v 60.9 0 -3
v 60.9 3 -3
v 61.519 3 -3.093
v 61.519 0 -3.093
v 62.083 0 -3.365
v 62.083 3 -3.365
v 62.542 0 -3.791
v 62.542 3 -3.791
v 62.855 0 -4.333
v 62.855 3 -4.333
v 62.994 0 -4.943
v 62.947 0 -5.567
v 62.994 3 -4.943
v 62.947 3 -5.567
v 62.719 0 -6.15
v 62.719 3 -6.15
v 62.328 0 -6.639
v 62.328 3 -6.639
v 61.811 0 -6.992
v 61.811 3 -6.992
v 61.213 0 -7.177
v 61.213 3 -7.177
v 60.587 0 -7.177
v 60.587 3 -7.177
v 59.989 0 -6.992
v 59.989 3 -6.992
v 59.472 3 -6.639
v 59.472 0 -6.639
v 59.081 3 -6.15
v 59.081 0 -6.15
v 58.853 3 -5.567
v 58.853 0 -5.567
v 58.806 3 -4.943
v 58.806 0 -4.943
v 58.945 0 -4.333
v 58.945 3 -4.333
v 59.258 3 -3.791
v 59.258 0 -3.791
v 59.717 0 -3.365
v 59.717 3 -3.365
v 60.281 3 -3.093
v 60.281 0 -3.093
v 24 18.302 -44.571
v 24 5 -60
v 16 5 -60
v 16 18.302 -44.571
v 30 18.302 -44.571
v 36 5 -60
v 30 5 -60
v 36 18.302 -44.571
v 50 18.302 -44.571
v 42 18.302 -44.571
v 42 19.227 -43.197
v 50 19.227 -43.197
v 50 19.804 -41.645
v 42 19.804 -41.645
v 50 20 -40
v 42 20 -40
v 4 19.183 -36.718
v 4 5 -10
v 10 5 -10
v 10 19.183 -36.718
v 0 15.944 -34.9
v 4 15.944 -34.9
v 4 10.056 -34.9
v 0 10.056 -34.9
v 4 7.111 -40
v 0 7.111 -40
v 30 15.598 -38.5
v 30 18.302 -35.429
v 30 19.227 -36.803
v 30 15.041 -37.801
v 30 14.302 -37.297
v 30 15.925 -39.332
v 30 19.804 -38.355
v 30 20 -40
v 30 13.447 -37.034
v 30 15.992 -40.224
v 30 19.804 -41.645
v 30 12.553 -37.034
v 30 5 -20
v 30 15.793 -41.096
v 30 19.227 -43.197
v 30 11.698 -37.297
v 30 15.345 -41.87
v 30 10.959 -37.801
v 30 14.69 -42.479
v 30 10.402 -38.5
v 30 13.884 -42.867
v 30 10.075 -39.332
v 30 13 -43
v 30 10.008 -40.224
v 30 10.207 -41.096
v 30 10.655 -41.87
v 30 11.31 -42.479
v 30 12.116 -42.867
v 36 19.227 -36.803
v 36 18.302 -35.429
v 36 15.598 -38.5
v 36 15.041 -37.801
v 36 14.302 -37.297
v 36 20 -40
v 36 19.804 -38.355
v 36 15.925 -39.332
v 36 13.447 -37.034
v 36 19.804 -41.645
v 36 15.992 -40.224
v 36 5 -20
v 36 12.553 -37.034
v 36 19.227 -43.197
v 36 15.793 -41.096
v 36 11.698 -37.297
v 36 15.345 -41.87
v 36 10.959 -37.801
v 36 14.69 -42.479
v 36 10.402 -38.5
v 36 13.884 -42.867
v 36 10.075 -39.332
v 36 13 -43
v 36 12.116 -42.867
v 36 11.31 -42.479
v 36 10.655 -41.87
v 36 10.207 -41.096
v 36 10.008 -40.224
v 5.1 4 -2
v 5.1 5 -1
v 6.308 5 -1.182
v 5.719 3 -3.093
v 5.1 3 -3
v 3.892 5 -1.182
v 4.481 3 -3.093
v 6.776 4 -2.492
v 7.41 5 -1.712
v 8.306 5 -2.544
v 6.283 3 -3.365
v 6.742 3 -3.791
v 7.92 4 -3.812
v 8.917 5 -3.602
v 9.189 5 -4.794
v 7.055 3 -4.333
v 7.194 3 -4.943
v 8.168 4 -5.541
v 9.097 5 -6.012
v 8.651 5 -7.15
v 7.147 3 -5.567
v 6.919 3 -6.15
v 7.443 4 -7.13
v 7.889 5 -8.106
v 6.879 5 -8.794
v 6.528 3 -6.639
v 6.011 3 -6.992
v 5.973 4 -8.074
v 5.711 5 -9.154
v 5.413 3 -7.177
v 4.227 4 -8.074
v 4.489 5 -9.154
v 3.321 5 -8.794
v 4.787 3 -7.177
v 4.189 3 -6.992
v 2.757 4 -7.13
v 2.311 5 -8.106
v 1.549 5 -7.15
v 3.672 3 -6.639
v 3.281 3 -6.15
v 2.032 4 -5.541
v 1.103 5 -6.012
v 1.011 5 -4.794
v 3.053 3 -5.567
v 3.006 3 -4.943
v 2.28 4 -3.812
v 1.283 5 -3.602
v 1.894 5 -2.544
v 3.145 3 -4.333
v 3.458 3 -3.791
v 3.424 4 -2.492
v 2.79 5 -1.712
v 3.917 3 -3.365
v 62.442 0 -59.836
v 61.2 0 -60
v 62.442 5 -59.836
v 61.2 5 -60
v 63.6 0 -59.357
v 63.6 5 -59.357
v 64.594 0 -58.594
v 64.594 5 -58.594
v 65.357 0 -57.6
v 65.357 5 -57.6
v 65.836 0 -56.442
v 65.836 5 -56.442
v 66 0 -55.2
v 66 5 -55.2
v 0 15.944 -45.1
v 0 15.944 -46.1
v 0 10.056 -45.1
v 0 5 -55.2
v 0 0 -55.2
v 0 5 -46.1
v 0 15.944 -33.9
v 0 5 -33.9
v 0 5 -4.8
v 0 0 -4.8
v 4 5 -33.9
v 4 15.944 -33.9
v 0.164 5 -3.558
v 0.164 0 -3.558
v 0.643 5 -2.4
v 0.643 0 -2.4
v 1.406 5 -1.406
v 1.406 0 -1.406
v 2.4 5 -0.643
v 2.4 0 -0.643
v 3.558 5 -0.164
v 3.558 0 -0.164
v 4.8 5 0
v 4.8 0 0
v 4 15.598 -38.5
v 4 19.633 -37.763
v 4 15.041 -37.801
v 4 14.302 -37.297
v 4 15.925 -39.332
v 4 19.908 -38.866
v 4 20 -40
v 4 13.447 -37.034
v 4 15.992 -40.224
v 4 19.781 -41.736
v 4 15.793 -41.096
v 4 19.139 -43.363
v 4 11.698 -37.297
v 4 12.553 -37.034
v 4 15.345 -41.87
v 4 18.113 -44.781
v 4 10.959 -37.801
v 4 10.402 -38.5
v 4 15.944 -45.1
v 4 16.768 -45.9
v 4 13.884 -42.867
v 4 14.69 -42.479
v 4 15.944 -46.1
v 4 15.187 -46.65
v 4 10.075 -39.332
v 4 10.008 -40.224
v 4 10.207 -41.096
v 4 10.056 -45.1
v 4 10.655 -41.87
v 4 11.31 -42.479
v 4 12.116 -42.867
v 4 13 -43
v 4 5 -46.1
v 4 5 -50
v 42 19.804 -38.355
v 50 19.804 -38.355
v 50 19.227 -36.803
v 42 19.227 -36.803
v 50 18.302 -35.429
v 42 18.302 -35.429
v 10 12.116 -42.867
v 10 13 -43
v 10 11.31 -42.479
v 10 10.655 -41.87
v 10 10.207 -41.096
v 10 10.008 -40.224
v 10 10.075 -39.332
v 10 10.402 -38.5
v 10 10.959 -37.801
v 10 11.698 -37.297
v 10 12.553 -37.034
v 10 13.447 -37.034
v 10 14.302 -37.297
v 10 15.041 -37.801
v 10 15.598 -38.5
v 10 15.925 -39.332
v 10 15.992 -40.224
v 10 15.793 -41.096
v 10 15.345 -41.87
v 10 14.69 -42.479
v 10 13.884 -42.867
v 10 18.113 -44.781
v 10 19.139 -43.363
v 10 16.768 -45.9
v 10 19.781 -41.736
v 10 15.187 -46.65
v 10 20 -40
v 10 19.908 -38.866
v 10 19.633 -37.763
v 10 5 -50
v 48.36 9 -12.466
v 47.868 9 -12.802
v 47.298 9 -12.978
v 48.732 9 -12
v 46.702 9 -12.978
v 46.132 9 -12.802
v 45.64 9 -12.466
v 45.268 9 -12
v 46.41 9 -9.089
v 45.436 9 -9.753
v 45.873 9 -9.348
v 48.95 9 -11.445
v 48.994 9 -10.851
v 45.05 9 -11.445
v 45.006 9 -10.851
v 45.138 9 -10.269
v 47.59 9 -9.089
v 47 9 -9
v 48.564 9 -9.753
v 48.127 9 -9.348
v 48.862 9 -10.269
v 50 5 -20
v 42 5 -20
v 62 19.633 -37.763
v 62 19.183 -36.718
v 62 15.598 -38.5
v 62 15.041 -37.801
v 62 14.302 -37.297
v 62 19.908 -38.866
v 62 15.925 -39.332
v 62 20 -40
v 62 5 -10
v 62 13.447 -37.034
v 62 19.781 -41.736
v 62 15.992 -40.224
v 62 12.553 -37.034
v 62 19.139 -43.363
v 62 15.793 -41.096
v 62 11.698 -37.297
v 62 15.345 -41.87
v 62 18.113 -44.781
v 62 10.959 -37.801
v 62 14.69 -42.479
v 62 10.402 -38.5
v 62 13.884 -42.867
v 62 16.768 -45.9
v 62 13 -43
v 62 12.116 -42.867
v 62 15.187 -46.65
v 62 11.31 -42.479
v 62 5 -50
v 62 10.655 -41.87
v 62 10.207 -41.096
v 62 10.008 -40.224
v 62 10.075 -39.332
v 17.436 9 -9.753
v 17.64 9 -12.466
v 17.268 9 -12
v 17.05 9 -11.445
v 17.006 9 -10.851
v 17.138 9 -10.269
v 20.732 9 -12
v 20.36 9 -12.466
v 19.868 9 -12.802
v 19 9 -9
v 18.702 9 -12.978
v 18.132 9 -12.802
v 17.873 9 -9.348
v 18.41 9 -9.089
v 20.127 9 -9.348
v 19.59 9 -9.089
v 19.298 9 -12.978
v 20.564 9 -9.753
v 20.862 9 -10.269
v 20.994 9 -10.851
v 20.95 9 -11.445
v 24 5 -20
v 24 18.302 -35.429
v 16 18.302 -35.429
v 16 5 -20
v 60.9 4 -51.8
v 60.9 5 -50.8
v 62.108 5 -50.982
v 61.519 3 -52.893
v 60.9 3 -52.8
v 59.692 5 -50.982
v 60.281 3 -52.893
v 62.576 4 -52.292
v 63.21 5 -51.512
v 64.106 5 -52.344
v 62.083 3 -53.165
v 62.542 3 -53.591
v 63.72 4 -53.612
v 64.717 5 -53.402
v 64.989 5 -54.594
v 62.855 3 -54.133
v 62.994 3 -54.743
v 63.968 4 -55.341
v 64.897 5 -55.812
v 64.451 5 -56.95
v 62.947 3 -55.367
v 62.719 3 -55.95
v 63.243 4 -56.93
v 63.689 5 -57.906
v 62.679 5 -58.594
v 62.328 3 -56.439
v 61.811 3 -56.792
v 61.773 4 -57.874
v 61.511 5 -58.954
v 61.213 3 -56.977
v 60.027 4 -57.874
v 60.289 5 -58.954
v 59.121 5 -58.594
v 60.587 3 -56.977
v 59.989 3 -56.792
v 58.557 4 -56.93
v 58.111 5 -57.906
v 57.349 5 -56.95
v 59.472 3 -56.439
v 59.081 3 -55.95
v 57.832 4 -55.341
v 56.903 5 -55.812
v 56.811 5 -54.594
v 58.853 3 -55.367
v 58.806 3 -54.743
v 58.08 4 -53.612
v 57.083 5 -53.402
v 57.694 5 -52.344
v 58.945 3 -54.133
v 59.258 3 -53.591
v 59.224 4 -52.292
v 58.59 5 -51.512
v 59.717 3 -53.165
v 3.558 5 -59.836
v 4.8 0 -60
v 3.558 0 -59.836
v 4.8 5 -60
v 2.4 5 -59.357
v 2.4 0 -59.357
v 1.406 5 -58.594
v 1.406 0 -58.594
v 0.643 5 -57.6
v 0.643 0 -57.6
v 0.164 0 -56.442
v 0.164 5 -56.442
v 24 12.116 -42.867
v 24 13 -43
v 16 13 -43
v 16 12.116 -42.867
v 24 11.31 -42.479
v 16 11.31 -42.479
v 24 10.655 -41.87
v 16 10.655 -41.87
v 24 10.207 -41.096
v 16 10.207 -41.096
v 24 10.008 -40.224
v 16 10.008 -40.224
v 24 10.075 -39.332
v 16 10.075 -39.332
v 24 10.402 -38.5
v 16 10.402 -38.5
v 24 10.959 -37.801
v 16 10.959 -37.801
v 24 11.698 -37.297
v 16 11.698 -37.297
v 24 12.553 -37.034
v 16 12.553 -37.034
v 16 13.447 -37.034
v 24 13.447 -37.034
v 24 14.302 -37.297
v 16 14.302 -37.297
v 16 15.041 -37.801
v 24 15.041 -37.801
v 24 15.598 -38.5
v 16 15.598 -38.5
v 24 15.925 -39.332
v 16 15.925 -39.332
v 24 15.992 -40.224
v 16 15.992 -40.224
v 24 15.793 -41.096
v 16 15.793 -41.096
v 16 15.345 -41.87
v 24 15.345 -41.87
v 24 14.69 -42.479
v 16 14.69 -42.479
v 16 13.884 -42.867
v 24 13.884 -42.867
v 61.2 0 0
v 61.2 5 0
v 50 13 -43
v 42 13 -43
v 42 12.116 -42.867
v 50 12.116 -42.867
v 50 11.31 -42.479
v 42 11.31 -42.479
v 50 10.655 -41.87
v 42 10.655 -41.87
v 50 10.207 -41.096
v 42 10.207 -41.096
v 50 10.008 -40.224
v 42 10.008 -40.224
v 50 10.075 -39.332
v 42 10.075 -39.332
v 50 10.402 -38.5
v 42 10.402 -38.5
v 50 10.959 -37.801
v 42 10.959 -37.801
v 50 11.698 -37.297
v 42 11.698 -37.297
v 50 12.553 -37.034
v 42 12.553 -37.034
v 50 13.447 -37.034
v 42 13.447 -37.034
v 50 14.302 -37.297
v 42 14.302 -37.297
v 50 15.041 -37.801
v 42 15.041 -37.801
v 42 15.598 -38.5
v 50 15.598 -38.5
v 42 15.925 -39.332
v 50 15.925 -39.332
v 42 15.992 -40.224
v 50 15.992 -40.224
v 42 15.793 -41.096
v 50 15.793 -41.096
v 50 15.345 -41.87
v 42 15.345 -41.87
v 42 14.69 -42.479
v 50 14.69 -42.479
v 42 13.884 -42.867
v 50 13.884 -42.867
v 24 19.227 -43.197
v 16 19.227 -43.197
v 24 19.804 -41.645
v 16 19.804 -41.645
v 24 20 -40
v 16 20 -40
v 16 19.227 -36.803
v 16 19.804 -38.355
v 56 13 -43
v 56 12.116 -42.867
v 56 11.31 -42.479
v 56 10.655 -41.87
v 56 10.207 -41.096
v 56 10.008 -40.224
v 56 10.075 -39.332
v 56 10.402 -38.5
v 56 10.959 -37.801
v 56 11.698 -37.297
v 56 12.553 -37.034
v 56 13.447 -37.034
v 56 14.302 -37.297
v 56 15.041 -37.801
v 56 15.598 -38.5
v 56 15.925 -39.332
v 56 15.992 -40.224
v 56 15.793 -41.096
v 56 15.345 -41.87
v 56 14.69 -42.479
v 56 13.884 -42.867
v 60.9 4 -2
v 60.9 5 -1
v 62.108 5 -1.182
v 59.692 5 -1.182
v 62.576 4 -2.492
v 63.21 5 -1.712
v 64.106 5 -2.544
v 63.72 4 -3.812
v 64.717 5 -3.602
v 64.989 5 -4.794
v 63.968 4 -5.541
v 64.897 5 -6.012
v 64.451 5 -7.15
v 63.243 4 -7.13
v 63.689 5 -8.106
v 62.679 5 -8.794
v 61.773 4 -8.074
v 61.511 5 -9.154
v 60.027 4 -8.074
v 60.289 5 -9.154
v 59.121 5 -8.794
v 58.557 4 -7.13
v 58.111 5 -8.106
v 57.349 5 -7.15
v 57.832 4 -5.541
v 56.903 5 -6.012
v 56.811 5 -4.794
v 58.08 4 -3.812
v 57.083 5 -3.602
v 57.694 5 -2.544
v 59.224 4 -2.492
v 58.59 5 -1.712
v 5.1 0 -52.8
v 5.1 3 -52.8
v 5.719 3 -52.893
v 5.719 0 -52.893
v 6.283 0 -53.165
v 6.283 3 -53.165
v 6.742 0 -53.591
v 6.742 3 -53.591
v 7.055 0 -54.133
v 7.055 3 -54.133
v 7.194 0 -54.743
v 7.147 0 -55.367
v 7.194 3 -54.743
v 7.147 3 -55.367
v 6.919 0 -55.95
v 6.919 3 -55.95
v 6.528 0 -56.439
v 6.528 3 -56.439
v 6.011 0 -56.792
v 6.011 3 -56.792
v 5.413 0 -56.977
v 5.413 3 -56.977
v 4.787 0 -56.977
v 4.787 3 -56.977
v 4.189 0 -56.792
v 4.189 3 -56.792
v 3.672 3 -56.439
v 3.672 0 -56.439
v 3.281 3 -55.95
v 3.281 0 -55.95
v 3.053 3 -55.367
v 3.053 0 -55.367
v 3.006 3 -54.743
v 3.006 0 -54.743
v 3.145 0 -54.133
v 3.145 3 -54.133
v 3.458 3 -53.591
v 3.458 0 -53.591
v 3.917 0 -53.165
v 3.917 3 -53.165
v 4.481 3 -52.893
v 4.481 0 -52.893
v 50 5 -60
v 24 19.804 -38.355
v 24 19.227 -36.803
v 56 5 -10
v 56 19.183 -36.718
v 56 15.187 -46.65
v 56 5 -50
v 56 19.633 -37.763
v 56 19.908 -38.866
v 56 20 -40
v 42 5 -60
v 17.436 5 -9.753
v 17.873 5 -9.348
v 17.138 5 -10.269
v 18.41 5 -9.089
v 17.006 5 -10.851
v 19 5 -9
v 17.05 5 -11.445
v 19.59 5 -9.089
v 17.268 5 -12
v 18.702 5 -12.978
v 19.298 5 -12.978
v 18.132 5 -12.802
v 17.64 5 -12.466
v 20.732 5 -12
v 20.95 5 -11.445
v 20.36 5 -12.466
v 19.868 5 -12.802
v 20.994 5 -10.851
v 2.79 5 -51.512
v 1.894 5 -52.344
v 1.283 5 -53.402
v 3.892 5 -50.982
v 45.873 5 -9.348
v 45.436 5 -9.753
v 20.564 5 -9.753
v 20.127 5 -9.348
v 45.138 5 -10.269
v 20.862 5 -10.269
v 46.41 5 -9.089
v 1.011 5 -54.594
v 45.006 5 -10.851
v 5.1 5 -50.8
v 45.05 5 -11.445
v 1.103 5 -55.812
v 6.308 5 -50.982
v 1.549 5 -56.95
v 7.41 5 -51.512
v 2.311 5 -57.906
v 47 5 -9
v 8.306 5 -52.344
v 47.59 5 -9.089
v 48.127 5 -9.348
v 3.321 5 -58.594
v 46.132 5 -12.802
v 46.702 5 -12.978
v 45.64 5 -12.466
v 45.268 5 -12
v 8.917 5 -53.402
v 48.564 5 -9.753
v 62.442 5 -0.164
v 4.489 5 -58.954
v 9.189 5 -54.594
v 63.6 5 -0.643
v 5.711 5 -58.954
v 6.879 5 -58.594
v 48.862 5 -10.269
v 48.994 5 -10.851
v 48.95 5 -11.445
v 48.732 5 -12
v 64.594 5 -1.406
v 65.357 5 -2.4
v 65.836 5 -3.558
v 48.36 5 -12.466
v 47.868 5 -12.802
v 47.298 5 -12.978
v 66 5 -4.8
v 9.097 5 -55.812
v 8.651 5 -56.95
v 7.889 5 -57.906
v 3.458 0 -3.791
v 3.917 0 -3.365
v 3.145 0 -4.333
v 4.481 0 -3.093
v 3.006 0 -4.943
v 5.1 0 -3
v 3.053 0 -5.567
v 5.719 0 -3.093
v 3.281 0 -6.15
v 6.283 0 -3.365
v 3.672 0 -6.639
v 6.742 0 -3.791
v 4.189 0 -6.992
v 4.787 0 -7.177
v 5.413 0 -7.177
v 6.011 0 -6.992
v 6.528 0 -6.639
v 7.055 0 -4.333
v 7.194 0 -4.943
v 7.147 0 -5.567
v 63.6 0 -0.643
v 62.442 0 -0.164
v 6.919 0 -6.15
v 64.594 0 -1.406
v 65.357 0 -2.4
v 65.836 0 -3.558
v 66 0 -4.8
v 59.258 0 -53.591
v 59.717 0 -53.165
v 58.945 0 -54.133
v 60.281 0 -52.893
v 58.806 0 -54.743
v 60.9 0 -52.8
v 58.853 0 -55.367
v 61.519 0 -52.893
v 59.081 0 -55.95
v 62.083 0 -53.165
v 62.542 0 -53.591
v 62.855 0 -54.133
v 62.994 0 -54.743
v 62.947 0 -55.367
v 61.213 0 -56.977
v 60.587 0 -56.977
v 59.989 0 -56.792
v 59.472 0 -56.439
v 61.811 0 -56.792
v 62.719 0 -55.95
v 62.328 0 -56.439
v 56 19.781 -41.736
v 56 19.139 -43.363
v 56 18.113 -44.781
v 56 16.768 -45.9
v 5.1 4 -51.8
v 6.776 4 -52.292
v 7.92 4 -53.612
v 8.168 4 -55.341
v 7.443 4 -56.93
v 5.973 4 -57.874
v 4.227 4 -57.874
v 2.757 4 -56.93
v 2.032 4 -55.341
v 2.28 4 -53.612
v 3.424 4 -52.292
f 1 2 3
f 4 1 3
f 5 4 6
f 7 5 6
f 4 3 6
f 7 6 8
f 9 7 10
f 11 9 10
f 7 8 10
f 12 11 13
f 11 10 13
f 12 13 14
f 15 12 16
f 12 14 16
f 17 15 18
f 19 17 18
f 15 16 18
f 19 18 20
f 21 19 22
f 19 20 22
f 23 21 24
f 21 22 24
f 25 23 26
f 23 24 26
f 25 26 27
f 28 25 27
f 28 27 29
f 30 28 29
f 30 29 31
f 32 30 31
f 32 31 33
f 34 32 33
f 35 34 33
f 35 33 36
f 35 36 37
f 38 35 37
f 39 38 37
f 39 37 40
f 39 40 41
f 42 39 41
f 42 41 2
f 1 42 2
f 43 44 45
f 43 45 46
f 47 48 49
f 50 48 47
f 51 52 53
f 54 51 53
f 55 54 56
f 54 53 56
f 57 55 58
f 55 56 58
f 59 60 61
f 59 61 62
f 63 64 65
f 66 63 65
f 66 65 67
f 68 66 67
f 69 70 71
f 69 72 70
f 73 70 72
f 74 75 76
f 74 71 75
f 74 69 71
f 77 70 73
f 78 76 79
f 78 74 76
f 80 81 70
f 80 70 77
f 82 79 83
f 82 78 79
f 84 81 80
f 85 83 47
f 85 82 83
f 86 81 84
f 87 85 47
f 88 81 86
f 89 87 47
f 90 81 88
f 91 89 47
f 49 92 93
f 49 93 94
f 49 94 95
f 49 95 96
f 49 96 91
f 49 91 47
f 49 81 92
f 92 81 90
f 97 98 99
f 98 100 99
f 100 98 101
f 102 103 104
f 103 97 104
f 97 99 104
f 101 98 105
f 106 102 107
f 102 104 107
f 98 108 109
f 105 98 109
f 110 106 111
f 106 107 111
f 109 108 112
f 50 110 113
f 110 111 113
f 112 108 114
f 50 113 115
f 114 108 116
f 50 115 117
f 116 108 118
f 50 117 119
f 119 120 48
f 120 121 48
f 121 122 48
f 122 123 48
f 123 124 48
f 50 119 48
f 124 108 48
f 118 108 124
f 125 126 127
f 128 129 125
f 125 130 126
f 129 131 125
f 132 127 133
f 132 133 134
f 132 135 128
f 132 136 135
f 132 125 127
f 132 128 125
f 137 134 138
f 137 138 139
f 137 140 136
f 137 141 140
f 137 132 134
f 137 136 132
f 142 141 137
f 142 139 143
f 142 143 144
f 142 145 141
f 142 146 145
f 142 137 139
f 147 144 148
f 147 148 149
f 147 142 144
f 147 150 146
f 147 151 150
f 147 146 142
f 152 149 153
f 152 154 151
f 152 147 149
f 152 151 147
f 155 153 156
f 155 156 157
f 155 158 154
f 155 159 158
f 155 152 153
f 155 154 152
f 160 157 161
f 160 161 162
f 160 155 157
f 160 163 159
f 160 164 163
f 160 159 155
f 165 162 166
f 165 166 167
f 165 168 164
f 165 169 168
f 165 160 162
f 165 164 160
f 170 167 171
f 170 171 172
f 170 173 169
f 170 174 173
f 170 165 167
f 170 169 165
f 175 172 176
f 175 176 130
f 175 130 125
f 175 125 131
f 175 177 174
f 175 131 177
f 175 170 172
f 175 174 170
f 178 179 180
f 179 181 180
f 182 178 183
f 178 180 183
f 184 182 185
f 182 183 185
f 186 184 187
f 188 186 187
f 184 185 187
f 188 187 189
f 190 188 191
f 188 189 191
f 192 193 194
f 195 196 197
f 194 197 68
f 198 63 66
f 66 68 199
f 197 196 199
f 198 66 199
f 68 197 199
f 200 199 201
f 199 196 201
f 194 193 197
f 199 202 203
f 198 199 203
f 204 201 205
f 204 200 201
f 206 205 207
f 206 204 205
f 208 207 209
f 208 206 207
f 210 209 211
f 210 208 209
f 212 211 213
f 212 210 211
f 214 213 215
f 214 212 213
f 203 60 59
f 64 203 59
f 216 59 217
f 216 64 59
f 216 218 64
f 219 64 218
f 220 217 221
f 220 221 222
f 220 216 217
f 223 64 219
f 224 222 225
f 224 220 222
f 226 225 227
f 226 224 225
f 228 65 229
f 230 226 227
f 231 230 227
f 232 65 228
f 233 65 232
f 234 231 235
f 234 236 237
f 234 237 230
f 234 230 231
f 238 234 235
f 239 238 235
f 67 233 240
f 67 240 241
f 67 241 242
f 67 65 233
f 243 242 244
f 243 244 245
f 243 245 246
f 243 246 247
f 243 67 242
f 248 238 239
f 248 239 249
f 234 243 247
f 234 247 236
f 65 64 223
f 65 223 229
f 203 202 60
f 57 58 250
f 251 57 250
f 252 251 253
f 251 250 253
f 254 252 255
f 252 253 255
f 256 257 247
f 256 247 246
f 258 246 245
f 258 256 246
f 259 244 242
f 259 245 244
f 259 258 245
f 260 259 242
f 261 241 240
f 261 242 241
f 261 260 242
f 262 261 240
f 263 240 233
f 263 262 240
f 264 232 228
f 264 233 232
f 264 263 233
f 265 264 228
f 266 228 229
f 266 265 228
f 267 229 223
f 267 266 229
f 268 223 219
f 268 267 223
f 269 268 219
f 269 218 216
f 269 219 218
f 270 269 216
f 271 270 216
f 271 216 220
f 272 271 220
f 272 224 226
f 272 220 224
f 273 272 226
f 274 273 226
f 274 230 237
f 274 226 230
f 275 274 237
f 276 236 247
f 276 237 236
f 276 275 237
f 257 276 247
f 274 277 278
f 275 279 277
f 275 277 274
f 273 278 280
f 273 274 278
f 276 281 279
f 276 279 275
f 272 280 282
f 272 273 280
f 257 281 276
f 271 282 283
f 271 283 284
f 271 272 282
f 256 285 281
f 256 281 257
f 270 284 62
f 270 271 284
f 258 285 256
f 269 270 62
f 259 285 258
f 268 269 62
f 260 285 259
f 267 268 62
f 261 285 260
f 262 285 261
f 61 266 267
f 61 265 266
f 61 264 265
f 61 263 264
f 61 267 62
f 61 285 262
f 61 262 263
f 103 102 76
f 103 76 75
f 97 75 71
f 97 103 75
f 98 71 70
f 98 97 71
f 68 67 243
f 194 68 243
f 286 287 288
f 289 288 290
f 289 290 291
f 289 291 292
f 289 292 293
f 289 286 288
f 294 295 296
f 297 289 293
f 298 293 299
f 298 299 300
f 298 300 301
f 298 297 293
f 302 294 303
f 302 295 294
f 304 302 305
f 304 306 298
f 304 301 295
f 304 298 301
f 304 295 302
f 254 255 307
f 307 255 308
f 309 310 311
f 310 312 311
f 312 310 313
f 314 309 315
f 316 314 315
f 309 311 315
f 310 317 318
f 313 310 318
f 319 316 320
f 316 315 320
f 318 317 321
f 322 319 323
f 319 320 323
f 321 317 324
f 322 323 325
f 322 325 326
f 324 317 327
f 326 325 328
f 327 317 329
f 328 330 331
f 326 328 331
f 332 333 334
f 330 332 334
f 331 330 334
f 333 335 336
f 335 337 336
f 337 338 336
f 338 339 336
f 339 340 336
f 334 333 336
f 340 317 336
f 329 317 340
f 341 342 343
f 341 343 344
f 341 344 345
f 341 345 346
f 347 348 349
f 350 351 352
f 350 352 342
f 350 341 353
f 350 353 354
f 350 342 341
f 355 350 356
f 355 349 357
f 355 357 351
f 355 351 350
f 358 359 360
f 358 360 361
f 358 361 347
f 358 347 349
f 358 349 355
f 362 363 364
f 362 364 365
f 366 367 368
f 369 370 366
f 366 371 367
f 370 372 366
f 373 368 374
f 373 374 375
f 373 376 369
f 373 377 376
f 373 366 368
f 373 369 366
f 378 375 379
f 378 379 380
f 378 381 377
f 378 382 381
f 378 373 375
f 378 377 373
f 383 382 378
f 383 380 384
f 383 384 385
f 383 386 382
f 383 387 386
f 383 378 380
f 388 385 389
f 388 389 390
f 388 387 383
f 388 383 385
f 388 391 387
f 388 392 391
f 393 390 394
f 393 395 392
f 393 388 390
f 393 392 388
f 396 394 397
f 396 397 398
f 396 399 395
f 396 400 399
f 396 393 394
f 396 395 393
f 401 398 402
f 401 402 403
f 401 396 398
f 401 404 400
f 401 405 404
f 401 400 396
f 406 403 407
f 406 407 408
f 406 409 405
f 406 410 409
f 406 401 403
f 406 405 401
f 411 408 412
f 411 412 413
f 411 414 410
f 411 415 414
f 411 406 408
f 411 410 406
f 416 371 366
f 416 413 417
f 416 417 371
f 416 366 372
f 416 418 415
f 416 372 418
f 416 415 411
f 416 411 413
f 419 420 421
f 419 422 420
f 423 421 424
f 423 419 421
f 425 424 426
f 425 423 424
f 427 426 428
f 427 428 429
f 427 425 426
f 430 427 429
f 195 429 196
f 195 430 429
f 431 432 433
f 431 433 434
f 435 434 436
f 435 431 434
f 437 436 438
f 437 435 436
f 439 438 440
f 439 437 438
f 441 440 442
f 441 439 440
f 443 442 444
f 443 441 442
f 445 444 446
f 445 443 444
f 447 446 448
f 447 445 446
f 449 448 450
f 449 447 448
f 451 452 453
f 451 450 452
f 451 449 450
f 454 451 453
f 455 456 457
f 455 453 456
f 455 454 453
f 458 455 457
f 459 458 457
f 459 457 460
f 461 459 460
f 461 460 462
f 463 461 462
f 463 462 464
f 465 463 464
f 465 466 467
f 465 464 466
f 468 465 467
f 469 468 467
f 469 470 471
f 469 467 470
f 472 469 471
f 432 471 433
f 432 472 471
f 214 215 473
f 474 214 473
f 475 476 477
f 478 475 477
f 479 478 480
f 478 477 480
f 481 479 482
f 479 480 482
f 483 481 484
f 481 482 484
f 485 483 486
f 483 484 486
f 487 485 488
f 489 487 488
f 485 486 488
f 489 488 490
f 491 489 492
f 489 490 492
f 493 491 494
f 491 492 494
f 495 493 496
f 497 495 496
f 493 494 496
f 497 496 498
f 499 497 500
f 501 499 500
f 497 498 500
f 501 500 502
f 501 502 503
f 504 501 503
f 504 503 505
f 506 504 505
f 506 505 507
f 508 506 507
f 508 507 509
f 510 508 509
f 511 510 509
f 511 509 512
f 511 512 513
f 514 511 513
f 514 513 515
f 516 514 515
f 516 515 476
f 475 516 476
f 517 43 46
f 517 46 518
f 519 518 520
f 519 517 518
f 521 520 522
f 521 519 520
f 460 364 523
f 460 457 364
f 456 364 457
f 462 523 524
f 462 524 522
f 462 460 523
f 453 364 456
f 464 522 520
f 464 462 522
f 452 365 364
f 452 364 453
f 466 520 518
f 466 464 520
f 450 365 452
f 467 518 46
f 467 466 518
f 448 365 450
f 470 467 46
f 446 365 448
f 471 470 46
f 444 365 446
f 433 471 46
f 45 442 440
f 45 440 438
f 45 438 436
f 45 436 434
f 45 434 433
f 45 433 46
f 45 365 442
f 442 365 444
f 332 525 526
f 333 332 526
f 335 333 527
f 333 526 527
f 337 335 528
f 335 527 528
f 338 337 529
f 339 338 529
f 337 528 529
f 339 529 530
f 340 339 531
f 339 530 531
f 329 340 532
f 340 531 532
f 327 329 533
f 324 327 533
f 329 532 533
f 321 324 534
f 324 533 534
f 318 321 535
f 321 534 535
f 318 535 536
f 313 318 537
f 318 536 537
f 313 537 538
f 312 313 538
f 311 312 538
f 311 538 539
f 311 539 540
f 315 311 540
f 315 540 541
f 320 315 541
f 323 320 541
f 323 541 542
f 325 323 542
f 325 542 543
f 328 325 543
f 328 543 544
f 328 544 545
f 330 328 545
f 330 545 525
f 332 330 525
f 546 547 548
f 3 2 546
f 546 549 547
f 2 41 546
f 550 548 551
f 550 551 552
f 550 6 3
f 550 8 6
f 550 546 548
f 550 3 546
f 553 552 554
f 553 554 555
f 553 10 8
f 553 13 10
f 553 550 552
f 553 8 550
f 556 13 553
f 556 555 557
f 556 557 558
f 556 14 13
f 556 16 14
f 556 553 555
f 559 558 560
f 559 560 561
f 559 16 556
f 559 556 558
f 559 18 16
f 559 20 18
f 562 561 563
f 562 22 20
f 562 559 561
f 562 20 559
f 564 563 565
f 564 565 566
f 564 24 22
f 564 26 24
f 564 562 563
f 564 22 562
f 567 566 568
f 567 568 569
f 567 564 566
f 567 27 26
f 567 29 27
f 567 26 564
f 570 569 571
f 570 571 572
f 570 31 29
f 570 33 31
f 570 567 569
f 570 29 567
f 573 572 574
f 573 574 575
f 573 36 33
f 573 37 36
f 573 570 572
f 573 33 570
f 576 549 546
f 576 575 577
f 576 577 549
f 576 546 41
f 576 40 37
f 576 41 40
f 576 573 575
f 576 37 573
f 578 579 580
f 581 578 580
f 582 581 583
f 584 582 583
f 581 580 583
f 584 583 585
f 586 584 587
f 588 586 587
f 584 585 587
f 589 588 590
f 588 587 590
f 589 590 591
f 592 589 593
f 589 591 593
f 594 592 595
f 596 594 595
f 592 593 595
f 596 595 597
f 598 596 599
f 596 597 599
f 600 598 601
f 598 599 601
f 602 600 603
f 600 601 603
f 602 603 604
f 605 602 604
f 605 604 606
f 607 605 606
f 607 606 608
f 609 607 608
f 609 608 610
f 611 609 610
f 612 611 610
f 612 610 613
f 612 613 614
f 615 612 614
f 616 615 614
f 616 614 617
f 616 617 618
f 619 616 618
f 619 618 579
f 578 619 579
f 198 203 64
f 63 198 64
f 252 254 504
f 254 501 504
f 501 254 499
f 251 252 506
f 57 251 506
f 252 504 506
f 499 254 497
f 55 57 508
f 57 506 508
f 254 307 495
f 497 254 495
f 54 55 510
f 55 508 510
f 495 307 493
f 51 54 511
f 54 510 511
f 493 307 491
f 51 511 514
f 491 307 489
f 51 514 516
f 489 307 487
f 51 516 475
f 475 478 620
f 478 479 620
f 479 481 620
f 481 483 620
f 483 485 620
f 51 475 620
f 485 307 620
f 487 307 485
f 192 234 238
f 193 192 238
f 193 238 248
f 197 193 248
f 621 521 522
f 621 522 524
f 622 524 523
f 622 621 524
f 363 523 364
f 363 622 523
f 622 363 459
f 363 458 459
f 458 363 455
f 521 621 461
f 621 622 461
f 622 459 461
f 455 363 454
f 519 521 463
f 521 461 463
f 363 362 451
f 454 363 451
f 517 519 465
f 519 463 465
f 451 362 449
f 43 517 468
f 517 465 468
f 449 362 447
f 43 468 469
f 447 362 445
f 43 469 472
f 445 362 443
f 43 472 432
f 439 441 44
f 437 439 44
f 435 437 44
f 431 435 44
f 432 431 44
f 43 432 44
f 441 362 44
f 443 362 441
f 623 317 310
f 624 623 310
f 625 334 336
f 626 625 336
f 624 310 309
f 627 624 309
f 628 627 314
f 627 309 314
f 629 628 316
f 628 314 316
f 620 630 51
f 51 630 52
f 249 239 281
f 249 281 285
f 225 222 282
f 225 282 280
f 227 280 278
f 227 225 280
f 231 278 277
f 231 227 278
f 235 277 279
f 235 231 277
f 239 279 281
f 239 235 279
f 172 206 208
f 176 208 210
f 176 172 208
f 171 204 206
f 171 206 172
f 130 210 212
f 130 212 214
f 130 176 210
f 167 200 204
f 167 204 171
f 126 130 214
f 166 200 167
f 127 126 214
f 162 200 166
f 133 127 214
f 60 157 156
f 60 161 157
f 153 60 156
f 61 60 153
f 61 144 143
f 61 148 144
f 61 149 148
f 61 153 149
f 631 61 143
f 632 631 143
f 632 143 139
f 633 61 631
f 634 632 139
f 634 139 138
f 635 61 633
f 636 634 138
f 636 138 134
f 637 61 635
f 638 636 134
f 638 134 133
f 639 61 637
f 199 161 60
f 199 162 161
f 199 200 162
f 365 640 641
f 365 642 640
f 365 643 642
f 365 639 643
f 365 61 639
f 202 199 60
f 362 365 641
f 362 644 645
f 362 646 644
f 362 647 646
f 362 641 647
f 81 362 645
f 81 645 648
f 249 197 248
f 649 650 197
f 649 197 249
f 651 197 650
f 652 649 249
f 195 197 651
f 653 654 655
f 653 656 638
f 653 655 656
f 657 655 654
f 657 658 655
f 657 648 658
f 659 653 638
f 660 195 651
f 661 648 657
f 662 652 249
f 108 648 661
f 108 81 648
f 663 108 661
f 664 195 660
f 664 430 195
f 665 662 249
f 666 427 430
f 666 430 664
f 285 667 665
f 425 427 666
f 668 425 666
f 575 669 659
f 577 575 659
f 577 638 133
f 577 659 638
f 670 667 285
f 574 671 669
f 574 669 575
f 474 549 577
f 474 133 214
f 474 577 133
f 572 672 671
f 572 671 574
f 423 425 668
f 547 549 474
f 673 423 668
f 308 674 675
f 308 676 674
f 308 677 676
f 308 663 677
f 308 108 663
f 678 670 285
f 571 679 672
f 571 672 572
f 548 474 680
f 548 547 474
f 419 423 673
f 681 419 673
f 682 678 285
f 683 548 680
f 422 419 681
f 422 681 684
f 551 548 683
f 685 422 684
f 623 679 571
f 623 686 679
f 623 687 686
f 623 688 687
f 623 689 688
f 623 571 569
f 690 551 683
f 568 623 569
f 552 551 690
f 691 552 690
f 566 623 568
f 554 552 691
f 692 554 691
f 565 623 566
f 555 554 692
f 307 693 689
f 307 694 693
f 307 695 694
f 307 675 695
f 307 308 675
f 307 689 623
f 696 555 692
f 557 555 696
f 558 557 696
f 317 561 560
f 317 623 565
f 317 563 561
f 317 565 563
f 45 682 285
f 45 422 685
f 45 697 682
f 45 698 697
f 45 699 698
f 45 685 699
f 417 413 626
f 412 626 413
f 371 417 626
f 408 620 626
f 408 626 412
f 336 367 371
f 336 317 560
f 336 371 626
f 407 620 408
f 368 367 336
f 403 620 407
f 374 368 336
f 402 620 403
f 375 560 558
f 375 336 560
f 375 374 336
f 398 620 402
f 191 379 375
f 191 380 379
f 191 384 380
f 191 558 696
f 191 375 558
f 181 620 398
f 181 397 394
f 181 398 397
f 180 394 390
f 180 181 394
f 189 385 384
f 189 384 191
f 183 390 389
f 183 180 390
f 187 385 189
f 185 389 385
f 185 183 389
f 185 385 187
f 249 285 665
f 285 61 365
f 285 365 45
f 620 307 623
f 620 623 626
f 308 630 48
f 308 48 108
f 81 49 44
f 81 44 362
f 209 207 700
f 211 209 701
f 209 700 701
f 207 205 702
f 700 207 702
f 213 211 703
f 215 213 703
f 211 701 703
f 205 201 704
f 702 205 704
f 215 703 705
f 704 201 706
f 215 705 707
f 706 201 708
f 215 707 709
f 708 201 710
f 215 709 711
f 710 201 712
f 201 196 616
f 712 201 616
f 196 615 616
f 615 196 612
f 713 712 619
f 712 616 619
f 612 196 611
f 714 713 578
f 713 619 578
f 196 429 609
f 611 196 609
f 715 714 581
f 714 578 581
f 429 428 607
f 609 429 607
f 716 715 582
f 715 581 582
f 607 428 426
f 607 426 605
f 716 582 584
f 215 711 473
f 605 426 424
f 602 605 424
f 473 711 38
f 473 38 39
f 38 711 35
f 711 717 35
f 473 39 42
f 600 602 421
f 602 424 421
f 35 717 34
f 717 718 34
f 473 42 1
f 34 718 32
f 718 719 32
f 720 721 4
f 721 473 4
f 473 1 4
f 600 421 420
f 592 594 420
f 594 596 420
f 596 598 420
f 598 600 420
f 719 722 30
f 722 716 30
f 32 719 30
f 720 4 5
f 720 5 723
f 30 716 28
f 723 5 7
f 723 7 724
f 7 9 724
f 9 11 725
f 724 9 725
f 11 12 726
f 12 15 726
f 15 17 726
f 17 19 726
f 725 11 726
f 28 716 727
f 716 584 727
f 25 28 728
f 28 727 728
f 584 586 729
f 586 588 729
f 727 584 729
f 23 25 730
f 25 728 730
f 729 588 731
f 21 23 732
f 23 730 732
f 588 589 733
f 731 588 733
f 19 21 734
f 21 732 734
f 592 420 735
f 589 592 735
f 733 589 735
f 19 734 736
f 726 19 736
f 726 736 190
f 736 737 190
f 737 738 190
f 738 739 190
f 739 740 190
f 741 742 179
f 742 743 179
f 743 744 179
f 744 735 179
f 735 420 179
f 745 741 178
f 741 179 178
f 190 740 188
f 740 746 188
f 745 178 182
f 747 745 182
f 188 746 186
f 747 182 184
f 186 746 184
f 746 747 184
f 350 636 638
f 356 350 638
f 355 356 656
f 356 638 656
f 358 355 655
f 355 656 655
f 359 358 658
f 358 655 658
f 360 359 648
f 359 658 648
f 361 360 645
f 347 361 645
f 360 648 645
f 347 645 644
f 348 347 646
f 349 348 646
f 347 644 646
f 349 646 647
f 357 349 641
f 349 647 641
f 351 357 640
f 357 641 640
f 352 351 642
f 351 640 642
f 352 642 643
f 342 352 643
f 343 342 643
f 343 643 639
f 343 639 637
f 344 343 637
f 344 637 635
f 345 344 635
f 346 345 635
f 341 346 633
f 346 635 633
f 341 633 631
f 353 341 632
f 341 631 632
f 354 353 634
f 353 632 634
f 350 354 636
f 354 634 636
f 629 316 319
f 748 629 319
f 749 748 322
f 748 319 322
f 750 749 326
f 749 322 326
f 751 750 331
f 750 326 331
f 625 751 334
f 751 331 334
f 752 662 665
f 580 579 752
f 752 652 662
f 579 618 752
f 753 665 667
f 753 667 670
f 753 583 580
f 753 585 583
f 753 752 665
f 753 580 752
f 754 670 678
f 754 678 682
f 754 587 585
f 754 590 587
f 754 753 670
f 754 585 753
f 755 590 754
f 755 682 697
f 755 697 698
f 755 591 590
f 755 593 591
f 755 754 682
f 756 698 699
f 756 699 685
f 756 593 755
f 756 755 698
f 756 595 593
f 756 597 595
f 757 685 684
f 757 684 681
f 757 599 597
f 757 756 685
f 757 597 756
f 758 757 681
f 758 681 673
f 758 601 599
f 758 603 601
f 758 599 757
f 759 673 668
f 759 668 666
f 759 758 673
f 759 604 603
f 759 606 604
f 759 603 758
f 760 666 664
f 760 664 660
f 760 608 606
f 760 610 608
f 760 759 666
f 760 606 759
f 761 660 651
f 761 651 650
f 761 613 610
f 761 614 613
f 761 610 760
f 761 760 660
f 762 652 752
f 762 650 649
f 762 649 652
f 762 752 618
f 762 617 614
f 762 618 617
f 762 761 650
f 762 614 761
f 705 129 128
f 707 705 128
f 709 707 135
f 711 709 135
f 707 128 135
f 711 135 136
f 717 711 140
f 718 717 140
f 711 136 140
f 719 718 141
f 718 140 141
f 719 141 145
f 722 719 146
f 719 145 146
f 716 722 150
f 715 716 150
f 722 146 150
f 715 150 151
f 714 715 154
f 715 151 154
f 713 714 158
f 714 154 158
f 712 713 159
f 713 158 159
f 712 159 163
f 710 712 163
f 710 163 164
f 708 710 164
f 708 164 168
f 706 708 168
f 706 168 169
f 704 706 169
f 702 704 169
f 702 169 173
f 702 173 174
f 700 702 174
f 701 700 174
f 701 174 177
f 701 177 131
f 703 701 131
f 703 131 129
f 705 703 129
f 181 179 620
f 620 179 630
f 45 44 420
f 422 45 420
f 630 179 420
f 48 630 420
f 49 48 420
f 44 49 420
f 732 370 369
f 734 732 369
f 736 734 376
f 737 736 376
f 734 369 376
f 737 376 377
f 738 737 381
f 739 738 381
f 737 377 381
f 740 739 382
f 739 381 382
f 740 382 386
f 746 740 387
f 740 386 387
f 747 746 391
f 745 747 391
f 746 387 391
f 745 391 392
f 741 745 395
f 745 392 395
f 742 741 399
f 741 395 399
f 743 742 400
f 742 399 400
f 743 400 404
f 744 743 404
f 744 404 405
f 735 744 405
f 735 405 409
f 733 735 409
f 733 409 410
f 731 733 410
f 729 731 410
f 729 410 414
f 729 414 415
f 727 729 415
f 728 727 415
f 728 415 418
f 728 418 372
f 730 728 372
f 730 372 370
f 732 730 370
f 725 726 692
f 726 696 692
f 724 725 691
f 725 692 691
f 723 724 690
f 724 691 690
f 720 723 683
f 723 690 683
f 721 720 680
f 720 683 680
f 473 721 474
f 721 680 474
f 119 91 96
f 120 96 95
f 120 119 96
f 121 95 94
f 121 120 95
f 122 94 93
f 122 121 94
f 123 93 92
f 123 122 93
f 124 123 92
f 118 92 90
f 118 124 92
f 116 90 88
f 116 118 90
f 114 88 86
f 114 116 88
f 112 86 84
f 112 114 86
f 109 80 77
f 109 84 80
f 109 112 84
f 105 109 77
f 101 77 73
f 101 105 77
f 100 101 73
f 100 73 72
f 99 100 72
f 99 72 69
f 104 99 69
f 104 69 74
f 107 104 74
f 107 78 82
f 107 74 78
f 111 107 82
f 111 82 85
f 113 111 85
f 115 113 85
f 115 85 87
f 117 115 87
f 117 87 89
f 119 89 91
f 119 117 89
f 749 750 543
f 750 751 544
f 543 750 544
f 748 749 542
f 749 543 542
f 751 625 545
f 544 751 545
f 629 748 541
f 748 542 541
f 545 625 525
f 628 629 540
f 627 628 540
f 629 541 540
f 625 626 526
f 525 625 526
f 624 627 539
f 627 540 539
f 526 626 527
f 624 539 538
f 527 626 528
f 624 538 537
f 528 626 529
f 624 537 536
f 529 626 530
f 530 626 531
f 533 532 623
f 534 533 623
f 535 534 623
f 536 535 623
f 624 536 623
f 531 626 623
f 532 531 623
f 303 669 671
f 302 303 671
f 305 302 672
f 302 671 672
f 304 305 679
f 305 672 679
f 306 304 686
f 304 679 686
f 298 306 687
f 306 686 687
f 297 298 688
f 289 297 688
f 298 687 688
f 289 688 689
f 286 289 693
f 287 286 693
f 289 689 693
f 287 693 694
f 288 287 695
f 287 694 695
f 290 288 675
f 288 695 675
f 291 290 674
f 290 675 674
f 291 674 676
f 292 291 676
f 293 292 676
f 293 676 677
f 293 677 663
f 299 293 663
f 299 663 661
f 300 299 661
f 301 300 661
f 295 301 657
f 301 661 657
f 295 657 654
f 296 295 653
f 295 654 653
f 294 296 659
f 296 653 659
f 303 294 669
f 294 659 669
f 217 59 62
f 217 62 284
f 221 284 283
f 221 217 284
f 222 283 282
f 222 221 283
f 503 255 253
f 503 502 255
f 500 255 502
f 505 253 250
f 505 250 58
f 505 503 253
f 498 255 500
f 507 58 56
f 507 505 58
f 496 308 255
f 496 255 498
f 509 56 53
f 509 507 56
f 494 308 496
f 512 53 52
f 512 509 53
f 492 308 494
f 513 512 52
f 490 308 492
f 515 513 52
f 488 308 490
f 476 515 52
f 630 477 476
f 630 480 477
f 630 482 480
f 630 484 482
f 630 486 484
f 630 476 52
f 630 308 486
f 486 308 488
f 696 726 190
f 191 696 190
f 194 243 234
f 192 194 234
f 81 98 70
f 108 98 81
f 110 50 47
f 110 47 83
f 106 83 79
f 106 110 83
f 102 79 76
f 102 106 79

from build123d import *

# Parameters (mm, degrees)
SKETCH4_W           = 6
SKETCH4_H           = 40
SKETCH4_W_2         = 8
BOSS_EXTRUDE4_DEPTH = 5
SKETCH6_W           = 6
SKETCH6_H           = 40
SKETCH6_W_2         = 8
BOSS_EXTRUDE5_DEPTH = 15
SKETCH7_R           = 3
CUT_EXTRUDE2_DEPTH  = 73.773621595
CUT_EXTRUDE3_REACH  = 74.774
CUT_EXTRUDE4_REACH  = 90.566
CUT_EXTRUDE5_REACH  = 92.449
SKETCH10_R          = 2.1
CHAMFER1_SIZE       = 2
FILLET1_R           = 4.8
SKETCH11_R          = 2
BOSS_EXTRUDE6_DEPTH = 4
BOSS_EXTRUDE7_DEPTH = 4


with BuildPart() as part:
    # Sketch4 → Boss-Extrude4 (new body)
    with BuildSketch(Plane(origin=(0, 0, 0), x_dir=(1, 0, 0), z_dir=(0, 1, 0))):
        Polygon((0, 60), (0, 0), (66, 0), (66, 60), (56, 60), (56, 50), (62, 50), (62, 10), (56, 10), (56, 20), (50, 20), (42, 20), (36, 20), (30, 20), (30, 60), align=None)
        with Locations((39, 40)):
            Rectangle(SKETCH4_W, SKETCH4_H)
        with Locations((33, 40)):
            Rectangle(SKETCH4_W, SKETCH4_H)
        with Locations((46, 40)):
            Rectangle(SKETCH4_W_2, SKETCH4_H)
        Polygon((56, 50), (56, 60), (50, 60), (50, 20), (56, 20), align=None)
        Polygon((62, 50), (56, 50), (56, 20), (56, 10), (62, 10), align=None)
    extrude(amount=BOSS_EXTRUDE4_DEPTH)

    # Sketch6 → Boss-Extrude5 (add)
    with BuildSketch(Plane(origin=(0, 5, 0), x_dir=(1, 0, 0), z_dir=(0, 1, 0))):
        with Locations((33, 40)):
            Rectangle(SKETCH6_W, SKETCH6_H)
        with Locations((46, 40)):
            Rectangle(SKETCH6_W_2, SKETCH6_H)
        Polygon((62, 50), (56, 50), (56, 20), (56, 10), (62, 10), align=None)
    boss_extrude5 = extrude(amount=BOSS_EXTRUDE5_DEPTH)

    # Sketch7 → Cut-Extrude2 (cut, through all)
    with BuildSketch(Plane.ZY.offset(-30)):
        with Locations(Location((-40, 13, 0), (0, 0, 180))):
            Circle(SKETCH7_R)
    cut_extrude2 = extrude(amount=-CUT_EXTRUDE2_DEPTH, mode=Mode.SUBTRACT)

    # Cut-Extrude3: up to this face of the body (flat: up to its plane)
    cut_extrude3_end = Plane(part.part.faces().sort_by_distance((50, 12.5, -20.427200187))[0])
    # Sketch8 → Cut-Extrude3 (cut, up to the picked face)
    with BuildSketch(Plane.ZY.offset(-30), mode=Mode.PRIVATE) as cut_extrude3_sk1:
        with BuildLine():
            Line((-60, 20), (-60, 5))
            Line((-60, 5), (-44.570704164, 18.30176041))
            ThreePointArc((-44.570704164, 18.30176041), (-42.437998885, 19.561719396), (-40, 20))
            Line((-40, 20), (-60, 20))
        make_face()
    cut_extrude3_tool1 = split(extrude(cut_extrude3_sk1.sketch, amount=-CUT_EXTRUDE3_REACH, mode=Mode.PRIVATE), bisect_by=cut_extrude3_end, keep=Keep.BOTH, mode=Mode.PRIVATE)
    # Sketch8 → Cut-Extrude3 (cut, up to the picked face)
    with BuildSketch(Plane.ZY.offset(-30), mode=Mode.PRIVATE) as cut_extrude3_sk2:
        with BuildLine():
            Line((-35.429295836, 18.30176041), (-20, 5))
            Line((-20, 5), (-20, 20))
            Line((-20, 20), (-40, 20))
            ThreePointArc((-40, 20), (-37.562001115, 19.561719396), (-35.429295836, 18.30176041))
        make_face()
    cut_extrude3_tool2 = split(extrude(cut_extrude3_sk2.sketch, amount=-CUT_EXTRUDE3_REACH, mode=Mode.PRIVATE), bisect_by=cut_extrude3_end, keep=Keep.BOTH, mode=Mode.PRIVATE)
    cut_extrude3_1 = cut_extrude3_tool1.solids().sort_by(Axis((30, 15.027454, -54.131076), (1, 0, 0)))[0]
    add(cut_extrude3_1, mode=Mode.SUBTRACT)
    cut_extrude3_2 = cut_extrude3_tool2.solids().sort_by(Axis((30, 15.027454, -25.868924), (1, 0, 0)))[0]
    add(cut_extrude3_2, mode=Mode.SUBTRACT)
    cut_extrude3 = cut_extrude3_1 + cut_extrude3_2  # Cut-Extrude3 as one shape, for the pattern or mirror that repeats it

    # Sketch9 → Cut-Extrude4 (cut, up to next)
    with BuildSketch(Plane(origin=(62, 0, 0), x_dir=(0, 0, -1), z_dir=(1, 0, 0)), mode=Mode.PRIVATE) as cut_extrude4_sk1:
        with BuildLine():
            ThreePointArc((36.717902336, 19.182866239), (38.30885596, 19.792645422), (40, 20))
            Line((40, 20), (10, 20))
            Line((10, 20), (10, 5))
            Line((10, 5), (36.717902336, 19.182866239))
        make_face()
    cut_extrude4_tool1 = extrude(cut_extrude4_sk1.sketch, amount=-CUT_EXTRUDE4_REACH, mode=Mode.PRIVATE) & part.part
    # Sketch9 → Cut-Extrude4 (cut, up to next)
    with BuildSketch(Plane(origin=(62, 0, 0), x_dir=(0, 0, -1), z_dir=(1, 0, 0)), mode=Mode.PRIVATE) as cut_extrude4_sk2:
        with BuildLine():
            ThreePointArc((40, 20), (44.104331221, 18.67049074), (46.649592052, 15.186990065))
            Line((46.649592052, 15.186990065), (50, 5))
            Line((50, 5), (50, 20))
            Line((50, 20), (40, 20))
        make_face()
    cut_extrude4_tool2 = extrude(cut_extrude4_sk2.sketch, amount=-CUT_EXTRUDE4_REACH, mode=Mode.PRIVATE) & part.part
    cut_extrude4_1 = cut_extrude4_tool1.solids().sort_by_distance((62, 15.005539, -19.440707))[0]
    add(cut_extrude4_1, mode=Mode.SUBTRACT)
    cut_extrude4_2 = cut_extrude4_tool2.solids().sort_by_distance((62, 15.452907, -47.894979))[0]
    add(cut_extrude4_2, mode=Mode.SUBTRACT)
    cut_extrude4 = cut_extrude4_1 + cut_extrude4_2  # Cut-Extrude4 as one shape, for the pattern or mirror that repeats it

    # Mirror1: Boss-Extrude5, Cut-Extrude2, Cut-Extrude3, Cut-Extrude4 across plane
    add(boss_extrude5.mirror(Plane.ZY.offset(-33)))
    add(cut_extrude2.mirror(Plane.ZY.offset(-33)), mode=Mode.SUBTRACT)
    add(cut_extrude3.mirror(Plane.ZY.offset(-33)), mode=Mode.SUBTRACT)
    add(cut_extrude4.mirror(Plane.ZY.offset(-33)), mode=Mode.SUBTRACT)

    # Sketch10 → Cut-Extrude5 (cut, up to next)
    with BuildSketch(Plane(origin=(0, 5, 0), x_dir=(1, 0, 0), z_dir=(0, 1, 0)), mode=Mode.PRIVATE) as cut_extrude5_sk1:
        with Locations(Location((5.1, 54.9, 0), (0, 0, 270))):
            Circle(SKETCH10_R)
    cut_extrude5_tool1 = extrude(cut_extrude5_sk1.sketch, amount=-CUT_EXTRUDE5_REACH, mode=Mode.PRIVATE) & part.part
    # Sketch10 → Cut-Extrude5 (cut, up to next)
    with BuildSketch(Plane(origin=(0, 5, 0), x_dir=(1, 0, 0), z_dir=(0, 1, 0)), mode=Mode.PRIVATE) as cut_extrude5_sk2:
        with Locations(Location((60.9, 54.9, 0), (0, 0, 270))):
            Circle(SKETCH10_R)
    cut_extrude5_tool2 = extrude(cut_extrude5_sk2.sketch, amount=-CUT_EXTRUDE5_REACH, mode=Mode.PRIVATE) & part.part
    # Sketch10 → Cut-Extrude5 (cut, up to next)
    with BuildSketch(Plane(origin=(0, 5, 0), x_dir=(1, 0, 0), z_dir=(0, 1, 0)), mode=Mode.PRIVATE) as cut_extrude5_sk3:
        with Locations(Location((60.9, 5.1, 0), (0, 0, 270))):
            Circle(SKETCH10_R)
    cut_extrude5_tool3 = extrude(cut_extrude5_sk3.sketch, amount=-CUT_EXTRUDE5_REACH, mode=Mode.PRIVATE) & part.part
    # Sketch10 → Cut-Extrude5 (cut, up to next)
    with BuildSketch(Plane(origin=(0, 5, 0), x_dir=(1, 0, 0), z_dir=(0, 1, 0)), mode=Mode.PRIVATE) as cut_extrude5_sk4:
        with Locations(Location((5.1, 5.1, 0), (0, 0, 270))):
            Circle(SKETCH10_R)
    cut_extrude5_tool4 = extrude(cut_extrude5_sk4.sketch, amount=-CUT_EXTRUDE5_REACH, mode=Mode.PRIVATE) & part.part
    add(cut_extrude5_tool1.solids().sort_by_distance((5.1, 5, -54.9))[0], mode=Mode.SUBTRACT)
    add(cut_extrude5_tool2.solids().sort_by_distance((60.9, 5, -54.9))[0], mode=Mode.SUBTRACT)
    add(cut_extrude5_tool3.solids().sort_by_distance((60.9, 5, -5.1))[0], mode=Mode.SUBTRACT)
    add(cut_extrude5_tool4.solids().sort_by_distance((5.1, 5, -5.1))[0], mode=Mode.SUBTRACT)

    # Chamfer1
    chamfer1_edges = [part.edges().sort_by_distance(p)[0] for p in [
        (5.1, 5, -7.2),
        (60.9, 5, -7.2),
        (60.9, 5, -57),
        (5.1, 5, -57),
    ]]
    chamfer(chamfer1_edges, length=CHAMFER1_SIZE)

    # Fillet1
    fillet1_edges = [part.edges().sort_by_distance(p)[0] for p in [
        (66, 2.5, 0),
        (0, 2.5, 0),
        (0, 2.5, -60),
        (66, 2.5, -60),
    ]]
    fillet(fillet1_edges, radius=FILLET1_R)

    # Sketch11 → Boss-Extrude6 (add)
    with BuildSketch(Plane(origin=(0, 5, 0), x_dir=(1, 0, 0), z_dir=(0, 1, 0))):
        with Locations(Location((19, 11, 0), (0, 0, 270))):
            Circle(SKETCH11_R)
        with Locations(Location((47, 11, 0), (0, 0, 270))):
            Circle(SKETCH11_R)
    extrude(amount=BOSS_EXTRUDE6_DEPTH)

    # Sketch12 → Boss-Extrude7 (add)
    with BuildSketch(Plane.ZY.offset(-4)):
        Polygon((-45.1, 10.055513627), (-45.1, 15.944486373), (-46.1, 15.944486373), (-46.1, 5), (-33.9, 5), (-33.9, 15.944486373), (-34.9, 15.944486373), (-34.9, 10.055513627), (-40, 7.111027254), align=None)
    extrude(amount=BOSS_EXTRUDE7_DEPTH)


solid = part.part
